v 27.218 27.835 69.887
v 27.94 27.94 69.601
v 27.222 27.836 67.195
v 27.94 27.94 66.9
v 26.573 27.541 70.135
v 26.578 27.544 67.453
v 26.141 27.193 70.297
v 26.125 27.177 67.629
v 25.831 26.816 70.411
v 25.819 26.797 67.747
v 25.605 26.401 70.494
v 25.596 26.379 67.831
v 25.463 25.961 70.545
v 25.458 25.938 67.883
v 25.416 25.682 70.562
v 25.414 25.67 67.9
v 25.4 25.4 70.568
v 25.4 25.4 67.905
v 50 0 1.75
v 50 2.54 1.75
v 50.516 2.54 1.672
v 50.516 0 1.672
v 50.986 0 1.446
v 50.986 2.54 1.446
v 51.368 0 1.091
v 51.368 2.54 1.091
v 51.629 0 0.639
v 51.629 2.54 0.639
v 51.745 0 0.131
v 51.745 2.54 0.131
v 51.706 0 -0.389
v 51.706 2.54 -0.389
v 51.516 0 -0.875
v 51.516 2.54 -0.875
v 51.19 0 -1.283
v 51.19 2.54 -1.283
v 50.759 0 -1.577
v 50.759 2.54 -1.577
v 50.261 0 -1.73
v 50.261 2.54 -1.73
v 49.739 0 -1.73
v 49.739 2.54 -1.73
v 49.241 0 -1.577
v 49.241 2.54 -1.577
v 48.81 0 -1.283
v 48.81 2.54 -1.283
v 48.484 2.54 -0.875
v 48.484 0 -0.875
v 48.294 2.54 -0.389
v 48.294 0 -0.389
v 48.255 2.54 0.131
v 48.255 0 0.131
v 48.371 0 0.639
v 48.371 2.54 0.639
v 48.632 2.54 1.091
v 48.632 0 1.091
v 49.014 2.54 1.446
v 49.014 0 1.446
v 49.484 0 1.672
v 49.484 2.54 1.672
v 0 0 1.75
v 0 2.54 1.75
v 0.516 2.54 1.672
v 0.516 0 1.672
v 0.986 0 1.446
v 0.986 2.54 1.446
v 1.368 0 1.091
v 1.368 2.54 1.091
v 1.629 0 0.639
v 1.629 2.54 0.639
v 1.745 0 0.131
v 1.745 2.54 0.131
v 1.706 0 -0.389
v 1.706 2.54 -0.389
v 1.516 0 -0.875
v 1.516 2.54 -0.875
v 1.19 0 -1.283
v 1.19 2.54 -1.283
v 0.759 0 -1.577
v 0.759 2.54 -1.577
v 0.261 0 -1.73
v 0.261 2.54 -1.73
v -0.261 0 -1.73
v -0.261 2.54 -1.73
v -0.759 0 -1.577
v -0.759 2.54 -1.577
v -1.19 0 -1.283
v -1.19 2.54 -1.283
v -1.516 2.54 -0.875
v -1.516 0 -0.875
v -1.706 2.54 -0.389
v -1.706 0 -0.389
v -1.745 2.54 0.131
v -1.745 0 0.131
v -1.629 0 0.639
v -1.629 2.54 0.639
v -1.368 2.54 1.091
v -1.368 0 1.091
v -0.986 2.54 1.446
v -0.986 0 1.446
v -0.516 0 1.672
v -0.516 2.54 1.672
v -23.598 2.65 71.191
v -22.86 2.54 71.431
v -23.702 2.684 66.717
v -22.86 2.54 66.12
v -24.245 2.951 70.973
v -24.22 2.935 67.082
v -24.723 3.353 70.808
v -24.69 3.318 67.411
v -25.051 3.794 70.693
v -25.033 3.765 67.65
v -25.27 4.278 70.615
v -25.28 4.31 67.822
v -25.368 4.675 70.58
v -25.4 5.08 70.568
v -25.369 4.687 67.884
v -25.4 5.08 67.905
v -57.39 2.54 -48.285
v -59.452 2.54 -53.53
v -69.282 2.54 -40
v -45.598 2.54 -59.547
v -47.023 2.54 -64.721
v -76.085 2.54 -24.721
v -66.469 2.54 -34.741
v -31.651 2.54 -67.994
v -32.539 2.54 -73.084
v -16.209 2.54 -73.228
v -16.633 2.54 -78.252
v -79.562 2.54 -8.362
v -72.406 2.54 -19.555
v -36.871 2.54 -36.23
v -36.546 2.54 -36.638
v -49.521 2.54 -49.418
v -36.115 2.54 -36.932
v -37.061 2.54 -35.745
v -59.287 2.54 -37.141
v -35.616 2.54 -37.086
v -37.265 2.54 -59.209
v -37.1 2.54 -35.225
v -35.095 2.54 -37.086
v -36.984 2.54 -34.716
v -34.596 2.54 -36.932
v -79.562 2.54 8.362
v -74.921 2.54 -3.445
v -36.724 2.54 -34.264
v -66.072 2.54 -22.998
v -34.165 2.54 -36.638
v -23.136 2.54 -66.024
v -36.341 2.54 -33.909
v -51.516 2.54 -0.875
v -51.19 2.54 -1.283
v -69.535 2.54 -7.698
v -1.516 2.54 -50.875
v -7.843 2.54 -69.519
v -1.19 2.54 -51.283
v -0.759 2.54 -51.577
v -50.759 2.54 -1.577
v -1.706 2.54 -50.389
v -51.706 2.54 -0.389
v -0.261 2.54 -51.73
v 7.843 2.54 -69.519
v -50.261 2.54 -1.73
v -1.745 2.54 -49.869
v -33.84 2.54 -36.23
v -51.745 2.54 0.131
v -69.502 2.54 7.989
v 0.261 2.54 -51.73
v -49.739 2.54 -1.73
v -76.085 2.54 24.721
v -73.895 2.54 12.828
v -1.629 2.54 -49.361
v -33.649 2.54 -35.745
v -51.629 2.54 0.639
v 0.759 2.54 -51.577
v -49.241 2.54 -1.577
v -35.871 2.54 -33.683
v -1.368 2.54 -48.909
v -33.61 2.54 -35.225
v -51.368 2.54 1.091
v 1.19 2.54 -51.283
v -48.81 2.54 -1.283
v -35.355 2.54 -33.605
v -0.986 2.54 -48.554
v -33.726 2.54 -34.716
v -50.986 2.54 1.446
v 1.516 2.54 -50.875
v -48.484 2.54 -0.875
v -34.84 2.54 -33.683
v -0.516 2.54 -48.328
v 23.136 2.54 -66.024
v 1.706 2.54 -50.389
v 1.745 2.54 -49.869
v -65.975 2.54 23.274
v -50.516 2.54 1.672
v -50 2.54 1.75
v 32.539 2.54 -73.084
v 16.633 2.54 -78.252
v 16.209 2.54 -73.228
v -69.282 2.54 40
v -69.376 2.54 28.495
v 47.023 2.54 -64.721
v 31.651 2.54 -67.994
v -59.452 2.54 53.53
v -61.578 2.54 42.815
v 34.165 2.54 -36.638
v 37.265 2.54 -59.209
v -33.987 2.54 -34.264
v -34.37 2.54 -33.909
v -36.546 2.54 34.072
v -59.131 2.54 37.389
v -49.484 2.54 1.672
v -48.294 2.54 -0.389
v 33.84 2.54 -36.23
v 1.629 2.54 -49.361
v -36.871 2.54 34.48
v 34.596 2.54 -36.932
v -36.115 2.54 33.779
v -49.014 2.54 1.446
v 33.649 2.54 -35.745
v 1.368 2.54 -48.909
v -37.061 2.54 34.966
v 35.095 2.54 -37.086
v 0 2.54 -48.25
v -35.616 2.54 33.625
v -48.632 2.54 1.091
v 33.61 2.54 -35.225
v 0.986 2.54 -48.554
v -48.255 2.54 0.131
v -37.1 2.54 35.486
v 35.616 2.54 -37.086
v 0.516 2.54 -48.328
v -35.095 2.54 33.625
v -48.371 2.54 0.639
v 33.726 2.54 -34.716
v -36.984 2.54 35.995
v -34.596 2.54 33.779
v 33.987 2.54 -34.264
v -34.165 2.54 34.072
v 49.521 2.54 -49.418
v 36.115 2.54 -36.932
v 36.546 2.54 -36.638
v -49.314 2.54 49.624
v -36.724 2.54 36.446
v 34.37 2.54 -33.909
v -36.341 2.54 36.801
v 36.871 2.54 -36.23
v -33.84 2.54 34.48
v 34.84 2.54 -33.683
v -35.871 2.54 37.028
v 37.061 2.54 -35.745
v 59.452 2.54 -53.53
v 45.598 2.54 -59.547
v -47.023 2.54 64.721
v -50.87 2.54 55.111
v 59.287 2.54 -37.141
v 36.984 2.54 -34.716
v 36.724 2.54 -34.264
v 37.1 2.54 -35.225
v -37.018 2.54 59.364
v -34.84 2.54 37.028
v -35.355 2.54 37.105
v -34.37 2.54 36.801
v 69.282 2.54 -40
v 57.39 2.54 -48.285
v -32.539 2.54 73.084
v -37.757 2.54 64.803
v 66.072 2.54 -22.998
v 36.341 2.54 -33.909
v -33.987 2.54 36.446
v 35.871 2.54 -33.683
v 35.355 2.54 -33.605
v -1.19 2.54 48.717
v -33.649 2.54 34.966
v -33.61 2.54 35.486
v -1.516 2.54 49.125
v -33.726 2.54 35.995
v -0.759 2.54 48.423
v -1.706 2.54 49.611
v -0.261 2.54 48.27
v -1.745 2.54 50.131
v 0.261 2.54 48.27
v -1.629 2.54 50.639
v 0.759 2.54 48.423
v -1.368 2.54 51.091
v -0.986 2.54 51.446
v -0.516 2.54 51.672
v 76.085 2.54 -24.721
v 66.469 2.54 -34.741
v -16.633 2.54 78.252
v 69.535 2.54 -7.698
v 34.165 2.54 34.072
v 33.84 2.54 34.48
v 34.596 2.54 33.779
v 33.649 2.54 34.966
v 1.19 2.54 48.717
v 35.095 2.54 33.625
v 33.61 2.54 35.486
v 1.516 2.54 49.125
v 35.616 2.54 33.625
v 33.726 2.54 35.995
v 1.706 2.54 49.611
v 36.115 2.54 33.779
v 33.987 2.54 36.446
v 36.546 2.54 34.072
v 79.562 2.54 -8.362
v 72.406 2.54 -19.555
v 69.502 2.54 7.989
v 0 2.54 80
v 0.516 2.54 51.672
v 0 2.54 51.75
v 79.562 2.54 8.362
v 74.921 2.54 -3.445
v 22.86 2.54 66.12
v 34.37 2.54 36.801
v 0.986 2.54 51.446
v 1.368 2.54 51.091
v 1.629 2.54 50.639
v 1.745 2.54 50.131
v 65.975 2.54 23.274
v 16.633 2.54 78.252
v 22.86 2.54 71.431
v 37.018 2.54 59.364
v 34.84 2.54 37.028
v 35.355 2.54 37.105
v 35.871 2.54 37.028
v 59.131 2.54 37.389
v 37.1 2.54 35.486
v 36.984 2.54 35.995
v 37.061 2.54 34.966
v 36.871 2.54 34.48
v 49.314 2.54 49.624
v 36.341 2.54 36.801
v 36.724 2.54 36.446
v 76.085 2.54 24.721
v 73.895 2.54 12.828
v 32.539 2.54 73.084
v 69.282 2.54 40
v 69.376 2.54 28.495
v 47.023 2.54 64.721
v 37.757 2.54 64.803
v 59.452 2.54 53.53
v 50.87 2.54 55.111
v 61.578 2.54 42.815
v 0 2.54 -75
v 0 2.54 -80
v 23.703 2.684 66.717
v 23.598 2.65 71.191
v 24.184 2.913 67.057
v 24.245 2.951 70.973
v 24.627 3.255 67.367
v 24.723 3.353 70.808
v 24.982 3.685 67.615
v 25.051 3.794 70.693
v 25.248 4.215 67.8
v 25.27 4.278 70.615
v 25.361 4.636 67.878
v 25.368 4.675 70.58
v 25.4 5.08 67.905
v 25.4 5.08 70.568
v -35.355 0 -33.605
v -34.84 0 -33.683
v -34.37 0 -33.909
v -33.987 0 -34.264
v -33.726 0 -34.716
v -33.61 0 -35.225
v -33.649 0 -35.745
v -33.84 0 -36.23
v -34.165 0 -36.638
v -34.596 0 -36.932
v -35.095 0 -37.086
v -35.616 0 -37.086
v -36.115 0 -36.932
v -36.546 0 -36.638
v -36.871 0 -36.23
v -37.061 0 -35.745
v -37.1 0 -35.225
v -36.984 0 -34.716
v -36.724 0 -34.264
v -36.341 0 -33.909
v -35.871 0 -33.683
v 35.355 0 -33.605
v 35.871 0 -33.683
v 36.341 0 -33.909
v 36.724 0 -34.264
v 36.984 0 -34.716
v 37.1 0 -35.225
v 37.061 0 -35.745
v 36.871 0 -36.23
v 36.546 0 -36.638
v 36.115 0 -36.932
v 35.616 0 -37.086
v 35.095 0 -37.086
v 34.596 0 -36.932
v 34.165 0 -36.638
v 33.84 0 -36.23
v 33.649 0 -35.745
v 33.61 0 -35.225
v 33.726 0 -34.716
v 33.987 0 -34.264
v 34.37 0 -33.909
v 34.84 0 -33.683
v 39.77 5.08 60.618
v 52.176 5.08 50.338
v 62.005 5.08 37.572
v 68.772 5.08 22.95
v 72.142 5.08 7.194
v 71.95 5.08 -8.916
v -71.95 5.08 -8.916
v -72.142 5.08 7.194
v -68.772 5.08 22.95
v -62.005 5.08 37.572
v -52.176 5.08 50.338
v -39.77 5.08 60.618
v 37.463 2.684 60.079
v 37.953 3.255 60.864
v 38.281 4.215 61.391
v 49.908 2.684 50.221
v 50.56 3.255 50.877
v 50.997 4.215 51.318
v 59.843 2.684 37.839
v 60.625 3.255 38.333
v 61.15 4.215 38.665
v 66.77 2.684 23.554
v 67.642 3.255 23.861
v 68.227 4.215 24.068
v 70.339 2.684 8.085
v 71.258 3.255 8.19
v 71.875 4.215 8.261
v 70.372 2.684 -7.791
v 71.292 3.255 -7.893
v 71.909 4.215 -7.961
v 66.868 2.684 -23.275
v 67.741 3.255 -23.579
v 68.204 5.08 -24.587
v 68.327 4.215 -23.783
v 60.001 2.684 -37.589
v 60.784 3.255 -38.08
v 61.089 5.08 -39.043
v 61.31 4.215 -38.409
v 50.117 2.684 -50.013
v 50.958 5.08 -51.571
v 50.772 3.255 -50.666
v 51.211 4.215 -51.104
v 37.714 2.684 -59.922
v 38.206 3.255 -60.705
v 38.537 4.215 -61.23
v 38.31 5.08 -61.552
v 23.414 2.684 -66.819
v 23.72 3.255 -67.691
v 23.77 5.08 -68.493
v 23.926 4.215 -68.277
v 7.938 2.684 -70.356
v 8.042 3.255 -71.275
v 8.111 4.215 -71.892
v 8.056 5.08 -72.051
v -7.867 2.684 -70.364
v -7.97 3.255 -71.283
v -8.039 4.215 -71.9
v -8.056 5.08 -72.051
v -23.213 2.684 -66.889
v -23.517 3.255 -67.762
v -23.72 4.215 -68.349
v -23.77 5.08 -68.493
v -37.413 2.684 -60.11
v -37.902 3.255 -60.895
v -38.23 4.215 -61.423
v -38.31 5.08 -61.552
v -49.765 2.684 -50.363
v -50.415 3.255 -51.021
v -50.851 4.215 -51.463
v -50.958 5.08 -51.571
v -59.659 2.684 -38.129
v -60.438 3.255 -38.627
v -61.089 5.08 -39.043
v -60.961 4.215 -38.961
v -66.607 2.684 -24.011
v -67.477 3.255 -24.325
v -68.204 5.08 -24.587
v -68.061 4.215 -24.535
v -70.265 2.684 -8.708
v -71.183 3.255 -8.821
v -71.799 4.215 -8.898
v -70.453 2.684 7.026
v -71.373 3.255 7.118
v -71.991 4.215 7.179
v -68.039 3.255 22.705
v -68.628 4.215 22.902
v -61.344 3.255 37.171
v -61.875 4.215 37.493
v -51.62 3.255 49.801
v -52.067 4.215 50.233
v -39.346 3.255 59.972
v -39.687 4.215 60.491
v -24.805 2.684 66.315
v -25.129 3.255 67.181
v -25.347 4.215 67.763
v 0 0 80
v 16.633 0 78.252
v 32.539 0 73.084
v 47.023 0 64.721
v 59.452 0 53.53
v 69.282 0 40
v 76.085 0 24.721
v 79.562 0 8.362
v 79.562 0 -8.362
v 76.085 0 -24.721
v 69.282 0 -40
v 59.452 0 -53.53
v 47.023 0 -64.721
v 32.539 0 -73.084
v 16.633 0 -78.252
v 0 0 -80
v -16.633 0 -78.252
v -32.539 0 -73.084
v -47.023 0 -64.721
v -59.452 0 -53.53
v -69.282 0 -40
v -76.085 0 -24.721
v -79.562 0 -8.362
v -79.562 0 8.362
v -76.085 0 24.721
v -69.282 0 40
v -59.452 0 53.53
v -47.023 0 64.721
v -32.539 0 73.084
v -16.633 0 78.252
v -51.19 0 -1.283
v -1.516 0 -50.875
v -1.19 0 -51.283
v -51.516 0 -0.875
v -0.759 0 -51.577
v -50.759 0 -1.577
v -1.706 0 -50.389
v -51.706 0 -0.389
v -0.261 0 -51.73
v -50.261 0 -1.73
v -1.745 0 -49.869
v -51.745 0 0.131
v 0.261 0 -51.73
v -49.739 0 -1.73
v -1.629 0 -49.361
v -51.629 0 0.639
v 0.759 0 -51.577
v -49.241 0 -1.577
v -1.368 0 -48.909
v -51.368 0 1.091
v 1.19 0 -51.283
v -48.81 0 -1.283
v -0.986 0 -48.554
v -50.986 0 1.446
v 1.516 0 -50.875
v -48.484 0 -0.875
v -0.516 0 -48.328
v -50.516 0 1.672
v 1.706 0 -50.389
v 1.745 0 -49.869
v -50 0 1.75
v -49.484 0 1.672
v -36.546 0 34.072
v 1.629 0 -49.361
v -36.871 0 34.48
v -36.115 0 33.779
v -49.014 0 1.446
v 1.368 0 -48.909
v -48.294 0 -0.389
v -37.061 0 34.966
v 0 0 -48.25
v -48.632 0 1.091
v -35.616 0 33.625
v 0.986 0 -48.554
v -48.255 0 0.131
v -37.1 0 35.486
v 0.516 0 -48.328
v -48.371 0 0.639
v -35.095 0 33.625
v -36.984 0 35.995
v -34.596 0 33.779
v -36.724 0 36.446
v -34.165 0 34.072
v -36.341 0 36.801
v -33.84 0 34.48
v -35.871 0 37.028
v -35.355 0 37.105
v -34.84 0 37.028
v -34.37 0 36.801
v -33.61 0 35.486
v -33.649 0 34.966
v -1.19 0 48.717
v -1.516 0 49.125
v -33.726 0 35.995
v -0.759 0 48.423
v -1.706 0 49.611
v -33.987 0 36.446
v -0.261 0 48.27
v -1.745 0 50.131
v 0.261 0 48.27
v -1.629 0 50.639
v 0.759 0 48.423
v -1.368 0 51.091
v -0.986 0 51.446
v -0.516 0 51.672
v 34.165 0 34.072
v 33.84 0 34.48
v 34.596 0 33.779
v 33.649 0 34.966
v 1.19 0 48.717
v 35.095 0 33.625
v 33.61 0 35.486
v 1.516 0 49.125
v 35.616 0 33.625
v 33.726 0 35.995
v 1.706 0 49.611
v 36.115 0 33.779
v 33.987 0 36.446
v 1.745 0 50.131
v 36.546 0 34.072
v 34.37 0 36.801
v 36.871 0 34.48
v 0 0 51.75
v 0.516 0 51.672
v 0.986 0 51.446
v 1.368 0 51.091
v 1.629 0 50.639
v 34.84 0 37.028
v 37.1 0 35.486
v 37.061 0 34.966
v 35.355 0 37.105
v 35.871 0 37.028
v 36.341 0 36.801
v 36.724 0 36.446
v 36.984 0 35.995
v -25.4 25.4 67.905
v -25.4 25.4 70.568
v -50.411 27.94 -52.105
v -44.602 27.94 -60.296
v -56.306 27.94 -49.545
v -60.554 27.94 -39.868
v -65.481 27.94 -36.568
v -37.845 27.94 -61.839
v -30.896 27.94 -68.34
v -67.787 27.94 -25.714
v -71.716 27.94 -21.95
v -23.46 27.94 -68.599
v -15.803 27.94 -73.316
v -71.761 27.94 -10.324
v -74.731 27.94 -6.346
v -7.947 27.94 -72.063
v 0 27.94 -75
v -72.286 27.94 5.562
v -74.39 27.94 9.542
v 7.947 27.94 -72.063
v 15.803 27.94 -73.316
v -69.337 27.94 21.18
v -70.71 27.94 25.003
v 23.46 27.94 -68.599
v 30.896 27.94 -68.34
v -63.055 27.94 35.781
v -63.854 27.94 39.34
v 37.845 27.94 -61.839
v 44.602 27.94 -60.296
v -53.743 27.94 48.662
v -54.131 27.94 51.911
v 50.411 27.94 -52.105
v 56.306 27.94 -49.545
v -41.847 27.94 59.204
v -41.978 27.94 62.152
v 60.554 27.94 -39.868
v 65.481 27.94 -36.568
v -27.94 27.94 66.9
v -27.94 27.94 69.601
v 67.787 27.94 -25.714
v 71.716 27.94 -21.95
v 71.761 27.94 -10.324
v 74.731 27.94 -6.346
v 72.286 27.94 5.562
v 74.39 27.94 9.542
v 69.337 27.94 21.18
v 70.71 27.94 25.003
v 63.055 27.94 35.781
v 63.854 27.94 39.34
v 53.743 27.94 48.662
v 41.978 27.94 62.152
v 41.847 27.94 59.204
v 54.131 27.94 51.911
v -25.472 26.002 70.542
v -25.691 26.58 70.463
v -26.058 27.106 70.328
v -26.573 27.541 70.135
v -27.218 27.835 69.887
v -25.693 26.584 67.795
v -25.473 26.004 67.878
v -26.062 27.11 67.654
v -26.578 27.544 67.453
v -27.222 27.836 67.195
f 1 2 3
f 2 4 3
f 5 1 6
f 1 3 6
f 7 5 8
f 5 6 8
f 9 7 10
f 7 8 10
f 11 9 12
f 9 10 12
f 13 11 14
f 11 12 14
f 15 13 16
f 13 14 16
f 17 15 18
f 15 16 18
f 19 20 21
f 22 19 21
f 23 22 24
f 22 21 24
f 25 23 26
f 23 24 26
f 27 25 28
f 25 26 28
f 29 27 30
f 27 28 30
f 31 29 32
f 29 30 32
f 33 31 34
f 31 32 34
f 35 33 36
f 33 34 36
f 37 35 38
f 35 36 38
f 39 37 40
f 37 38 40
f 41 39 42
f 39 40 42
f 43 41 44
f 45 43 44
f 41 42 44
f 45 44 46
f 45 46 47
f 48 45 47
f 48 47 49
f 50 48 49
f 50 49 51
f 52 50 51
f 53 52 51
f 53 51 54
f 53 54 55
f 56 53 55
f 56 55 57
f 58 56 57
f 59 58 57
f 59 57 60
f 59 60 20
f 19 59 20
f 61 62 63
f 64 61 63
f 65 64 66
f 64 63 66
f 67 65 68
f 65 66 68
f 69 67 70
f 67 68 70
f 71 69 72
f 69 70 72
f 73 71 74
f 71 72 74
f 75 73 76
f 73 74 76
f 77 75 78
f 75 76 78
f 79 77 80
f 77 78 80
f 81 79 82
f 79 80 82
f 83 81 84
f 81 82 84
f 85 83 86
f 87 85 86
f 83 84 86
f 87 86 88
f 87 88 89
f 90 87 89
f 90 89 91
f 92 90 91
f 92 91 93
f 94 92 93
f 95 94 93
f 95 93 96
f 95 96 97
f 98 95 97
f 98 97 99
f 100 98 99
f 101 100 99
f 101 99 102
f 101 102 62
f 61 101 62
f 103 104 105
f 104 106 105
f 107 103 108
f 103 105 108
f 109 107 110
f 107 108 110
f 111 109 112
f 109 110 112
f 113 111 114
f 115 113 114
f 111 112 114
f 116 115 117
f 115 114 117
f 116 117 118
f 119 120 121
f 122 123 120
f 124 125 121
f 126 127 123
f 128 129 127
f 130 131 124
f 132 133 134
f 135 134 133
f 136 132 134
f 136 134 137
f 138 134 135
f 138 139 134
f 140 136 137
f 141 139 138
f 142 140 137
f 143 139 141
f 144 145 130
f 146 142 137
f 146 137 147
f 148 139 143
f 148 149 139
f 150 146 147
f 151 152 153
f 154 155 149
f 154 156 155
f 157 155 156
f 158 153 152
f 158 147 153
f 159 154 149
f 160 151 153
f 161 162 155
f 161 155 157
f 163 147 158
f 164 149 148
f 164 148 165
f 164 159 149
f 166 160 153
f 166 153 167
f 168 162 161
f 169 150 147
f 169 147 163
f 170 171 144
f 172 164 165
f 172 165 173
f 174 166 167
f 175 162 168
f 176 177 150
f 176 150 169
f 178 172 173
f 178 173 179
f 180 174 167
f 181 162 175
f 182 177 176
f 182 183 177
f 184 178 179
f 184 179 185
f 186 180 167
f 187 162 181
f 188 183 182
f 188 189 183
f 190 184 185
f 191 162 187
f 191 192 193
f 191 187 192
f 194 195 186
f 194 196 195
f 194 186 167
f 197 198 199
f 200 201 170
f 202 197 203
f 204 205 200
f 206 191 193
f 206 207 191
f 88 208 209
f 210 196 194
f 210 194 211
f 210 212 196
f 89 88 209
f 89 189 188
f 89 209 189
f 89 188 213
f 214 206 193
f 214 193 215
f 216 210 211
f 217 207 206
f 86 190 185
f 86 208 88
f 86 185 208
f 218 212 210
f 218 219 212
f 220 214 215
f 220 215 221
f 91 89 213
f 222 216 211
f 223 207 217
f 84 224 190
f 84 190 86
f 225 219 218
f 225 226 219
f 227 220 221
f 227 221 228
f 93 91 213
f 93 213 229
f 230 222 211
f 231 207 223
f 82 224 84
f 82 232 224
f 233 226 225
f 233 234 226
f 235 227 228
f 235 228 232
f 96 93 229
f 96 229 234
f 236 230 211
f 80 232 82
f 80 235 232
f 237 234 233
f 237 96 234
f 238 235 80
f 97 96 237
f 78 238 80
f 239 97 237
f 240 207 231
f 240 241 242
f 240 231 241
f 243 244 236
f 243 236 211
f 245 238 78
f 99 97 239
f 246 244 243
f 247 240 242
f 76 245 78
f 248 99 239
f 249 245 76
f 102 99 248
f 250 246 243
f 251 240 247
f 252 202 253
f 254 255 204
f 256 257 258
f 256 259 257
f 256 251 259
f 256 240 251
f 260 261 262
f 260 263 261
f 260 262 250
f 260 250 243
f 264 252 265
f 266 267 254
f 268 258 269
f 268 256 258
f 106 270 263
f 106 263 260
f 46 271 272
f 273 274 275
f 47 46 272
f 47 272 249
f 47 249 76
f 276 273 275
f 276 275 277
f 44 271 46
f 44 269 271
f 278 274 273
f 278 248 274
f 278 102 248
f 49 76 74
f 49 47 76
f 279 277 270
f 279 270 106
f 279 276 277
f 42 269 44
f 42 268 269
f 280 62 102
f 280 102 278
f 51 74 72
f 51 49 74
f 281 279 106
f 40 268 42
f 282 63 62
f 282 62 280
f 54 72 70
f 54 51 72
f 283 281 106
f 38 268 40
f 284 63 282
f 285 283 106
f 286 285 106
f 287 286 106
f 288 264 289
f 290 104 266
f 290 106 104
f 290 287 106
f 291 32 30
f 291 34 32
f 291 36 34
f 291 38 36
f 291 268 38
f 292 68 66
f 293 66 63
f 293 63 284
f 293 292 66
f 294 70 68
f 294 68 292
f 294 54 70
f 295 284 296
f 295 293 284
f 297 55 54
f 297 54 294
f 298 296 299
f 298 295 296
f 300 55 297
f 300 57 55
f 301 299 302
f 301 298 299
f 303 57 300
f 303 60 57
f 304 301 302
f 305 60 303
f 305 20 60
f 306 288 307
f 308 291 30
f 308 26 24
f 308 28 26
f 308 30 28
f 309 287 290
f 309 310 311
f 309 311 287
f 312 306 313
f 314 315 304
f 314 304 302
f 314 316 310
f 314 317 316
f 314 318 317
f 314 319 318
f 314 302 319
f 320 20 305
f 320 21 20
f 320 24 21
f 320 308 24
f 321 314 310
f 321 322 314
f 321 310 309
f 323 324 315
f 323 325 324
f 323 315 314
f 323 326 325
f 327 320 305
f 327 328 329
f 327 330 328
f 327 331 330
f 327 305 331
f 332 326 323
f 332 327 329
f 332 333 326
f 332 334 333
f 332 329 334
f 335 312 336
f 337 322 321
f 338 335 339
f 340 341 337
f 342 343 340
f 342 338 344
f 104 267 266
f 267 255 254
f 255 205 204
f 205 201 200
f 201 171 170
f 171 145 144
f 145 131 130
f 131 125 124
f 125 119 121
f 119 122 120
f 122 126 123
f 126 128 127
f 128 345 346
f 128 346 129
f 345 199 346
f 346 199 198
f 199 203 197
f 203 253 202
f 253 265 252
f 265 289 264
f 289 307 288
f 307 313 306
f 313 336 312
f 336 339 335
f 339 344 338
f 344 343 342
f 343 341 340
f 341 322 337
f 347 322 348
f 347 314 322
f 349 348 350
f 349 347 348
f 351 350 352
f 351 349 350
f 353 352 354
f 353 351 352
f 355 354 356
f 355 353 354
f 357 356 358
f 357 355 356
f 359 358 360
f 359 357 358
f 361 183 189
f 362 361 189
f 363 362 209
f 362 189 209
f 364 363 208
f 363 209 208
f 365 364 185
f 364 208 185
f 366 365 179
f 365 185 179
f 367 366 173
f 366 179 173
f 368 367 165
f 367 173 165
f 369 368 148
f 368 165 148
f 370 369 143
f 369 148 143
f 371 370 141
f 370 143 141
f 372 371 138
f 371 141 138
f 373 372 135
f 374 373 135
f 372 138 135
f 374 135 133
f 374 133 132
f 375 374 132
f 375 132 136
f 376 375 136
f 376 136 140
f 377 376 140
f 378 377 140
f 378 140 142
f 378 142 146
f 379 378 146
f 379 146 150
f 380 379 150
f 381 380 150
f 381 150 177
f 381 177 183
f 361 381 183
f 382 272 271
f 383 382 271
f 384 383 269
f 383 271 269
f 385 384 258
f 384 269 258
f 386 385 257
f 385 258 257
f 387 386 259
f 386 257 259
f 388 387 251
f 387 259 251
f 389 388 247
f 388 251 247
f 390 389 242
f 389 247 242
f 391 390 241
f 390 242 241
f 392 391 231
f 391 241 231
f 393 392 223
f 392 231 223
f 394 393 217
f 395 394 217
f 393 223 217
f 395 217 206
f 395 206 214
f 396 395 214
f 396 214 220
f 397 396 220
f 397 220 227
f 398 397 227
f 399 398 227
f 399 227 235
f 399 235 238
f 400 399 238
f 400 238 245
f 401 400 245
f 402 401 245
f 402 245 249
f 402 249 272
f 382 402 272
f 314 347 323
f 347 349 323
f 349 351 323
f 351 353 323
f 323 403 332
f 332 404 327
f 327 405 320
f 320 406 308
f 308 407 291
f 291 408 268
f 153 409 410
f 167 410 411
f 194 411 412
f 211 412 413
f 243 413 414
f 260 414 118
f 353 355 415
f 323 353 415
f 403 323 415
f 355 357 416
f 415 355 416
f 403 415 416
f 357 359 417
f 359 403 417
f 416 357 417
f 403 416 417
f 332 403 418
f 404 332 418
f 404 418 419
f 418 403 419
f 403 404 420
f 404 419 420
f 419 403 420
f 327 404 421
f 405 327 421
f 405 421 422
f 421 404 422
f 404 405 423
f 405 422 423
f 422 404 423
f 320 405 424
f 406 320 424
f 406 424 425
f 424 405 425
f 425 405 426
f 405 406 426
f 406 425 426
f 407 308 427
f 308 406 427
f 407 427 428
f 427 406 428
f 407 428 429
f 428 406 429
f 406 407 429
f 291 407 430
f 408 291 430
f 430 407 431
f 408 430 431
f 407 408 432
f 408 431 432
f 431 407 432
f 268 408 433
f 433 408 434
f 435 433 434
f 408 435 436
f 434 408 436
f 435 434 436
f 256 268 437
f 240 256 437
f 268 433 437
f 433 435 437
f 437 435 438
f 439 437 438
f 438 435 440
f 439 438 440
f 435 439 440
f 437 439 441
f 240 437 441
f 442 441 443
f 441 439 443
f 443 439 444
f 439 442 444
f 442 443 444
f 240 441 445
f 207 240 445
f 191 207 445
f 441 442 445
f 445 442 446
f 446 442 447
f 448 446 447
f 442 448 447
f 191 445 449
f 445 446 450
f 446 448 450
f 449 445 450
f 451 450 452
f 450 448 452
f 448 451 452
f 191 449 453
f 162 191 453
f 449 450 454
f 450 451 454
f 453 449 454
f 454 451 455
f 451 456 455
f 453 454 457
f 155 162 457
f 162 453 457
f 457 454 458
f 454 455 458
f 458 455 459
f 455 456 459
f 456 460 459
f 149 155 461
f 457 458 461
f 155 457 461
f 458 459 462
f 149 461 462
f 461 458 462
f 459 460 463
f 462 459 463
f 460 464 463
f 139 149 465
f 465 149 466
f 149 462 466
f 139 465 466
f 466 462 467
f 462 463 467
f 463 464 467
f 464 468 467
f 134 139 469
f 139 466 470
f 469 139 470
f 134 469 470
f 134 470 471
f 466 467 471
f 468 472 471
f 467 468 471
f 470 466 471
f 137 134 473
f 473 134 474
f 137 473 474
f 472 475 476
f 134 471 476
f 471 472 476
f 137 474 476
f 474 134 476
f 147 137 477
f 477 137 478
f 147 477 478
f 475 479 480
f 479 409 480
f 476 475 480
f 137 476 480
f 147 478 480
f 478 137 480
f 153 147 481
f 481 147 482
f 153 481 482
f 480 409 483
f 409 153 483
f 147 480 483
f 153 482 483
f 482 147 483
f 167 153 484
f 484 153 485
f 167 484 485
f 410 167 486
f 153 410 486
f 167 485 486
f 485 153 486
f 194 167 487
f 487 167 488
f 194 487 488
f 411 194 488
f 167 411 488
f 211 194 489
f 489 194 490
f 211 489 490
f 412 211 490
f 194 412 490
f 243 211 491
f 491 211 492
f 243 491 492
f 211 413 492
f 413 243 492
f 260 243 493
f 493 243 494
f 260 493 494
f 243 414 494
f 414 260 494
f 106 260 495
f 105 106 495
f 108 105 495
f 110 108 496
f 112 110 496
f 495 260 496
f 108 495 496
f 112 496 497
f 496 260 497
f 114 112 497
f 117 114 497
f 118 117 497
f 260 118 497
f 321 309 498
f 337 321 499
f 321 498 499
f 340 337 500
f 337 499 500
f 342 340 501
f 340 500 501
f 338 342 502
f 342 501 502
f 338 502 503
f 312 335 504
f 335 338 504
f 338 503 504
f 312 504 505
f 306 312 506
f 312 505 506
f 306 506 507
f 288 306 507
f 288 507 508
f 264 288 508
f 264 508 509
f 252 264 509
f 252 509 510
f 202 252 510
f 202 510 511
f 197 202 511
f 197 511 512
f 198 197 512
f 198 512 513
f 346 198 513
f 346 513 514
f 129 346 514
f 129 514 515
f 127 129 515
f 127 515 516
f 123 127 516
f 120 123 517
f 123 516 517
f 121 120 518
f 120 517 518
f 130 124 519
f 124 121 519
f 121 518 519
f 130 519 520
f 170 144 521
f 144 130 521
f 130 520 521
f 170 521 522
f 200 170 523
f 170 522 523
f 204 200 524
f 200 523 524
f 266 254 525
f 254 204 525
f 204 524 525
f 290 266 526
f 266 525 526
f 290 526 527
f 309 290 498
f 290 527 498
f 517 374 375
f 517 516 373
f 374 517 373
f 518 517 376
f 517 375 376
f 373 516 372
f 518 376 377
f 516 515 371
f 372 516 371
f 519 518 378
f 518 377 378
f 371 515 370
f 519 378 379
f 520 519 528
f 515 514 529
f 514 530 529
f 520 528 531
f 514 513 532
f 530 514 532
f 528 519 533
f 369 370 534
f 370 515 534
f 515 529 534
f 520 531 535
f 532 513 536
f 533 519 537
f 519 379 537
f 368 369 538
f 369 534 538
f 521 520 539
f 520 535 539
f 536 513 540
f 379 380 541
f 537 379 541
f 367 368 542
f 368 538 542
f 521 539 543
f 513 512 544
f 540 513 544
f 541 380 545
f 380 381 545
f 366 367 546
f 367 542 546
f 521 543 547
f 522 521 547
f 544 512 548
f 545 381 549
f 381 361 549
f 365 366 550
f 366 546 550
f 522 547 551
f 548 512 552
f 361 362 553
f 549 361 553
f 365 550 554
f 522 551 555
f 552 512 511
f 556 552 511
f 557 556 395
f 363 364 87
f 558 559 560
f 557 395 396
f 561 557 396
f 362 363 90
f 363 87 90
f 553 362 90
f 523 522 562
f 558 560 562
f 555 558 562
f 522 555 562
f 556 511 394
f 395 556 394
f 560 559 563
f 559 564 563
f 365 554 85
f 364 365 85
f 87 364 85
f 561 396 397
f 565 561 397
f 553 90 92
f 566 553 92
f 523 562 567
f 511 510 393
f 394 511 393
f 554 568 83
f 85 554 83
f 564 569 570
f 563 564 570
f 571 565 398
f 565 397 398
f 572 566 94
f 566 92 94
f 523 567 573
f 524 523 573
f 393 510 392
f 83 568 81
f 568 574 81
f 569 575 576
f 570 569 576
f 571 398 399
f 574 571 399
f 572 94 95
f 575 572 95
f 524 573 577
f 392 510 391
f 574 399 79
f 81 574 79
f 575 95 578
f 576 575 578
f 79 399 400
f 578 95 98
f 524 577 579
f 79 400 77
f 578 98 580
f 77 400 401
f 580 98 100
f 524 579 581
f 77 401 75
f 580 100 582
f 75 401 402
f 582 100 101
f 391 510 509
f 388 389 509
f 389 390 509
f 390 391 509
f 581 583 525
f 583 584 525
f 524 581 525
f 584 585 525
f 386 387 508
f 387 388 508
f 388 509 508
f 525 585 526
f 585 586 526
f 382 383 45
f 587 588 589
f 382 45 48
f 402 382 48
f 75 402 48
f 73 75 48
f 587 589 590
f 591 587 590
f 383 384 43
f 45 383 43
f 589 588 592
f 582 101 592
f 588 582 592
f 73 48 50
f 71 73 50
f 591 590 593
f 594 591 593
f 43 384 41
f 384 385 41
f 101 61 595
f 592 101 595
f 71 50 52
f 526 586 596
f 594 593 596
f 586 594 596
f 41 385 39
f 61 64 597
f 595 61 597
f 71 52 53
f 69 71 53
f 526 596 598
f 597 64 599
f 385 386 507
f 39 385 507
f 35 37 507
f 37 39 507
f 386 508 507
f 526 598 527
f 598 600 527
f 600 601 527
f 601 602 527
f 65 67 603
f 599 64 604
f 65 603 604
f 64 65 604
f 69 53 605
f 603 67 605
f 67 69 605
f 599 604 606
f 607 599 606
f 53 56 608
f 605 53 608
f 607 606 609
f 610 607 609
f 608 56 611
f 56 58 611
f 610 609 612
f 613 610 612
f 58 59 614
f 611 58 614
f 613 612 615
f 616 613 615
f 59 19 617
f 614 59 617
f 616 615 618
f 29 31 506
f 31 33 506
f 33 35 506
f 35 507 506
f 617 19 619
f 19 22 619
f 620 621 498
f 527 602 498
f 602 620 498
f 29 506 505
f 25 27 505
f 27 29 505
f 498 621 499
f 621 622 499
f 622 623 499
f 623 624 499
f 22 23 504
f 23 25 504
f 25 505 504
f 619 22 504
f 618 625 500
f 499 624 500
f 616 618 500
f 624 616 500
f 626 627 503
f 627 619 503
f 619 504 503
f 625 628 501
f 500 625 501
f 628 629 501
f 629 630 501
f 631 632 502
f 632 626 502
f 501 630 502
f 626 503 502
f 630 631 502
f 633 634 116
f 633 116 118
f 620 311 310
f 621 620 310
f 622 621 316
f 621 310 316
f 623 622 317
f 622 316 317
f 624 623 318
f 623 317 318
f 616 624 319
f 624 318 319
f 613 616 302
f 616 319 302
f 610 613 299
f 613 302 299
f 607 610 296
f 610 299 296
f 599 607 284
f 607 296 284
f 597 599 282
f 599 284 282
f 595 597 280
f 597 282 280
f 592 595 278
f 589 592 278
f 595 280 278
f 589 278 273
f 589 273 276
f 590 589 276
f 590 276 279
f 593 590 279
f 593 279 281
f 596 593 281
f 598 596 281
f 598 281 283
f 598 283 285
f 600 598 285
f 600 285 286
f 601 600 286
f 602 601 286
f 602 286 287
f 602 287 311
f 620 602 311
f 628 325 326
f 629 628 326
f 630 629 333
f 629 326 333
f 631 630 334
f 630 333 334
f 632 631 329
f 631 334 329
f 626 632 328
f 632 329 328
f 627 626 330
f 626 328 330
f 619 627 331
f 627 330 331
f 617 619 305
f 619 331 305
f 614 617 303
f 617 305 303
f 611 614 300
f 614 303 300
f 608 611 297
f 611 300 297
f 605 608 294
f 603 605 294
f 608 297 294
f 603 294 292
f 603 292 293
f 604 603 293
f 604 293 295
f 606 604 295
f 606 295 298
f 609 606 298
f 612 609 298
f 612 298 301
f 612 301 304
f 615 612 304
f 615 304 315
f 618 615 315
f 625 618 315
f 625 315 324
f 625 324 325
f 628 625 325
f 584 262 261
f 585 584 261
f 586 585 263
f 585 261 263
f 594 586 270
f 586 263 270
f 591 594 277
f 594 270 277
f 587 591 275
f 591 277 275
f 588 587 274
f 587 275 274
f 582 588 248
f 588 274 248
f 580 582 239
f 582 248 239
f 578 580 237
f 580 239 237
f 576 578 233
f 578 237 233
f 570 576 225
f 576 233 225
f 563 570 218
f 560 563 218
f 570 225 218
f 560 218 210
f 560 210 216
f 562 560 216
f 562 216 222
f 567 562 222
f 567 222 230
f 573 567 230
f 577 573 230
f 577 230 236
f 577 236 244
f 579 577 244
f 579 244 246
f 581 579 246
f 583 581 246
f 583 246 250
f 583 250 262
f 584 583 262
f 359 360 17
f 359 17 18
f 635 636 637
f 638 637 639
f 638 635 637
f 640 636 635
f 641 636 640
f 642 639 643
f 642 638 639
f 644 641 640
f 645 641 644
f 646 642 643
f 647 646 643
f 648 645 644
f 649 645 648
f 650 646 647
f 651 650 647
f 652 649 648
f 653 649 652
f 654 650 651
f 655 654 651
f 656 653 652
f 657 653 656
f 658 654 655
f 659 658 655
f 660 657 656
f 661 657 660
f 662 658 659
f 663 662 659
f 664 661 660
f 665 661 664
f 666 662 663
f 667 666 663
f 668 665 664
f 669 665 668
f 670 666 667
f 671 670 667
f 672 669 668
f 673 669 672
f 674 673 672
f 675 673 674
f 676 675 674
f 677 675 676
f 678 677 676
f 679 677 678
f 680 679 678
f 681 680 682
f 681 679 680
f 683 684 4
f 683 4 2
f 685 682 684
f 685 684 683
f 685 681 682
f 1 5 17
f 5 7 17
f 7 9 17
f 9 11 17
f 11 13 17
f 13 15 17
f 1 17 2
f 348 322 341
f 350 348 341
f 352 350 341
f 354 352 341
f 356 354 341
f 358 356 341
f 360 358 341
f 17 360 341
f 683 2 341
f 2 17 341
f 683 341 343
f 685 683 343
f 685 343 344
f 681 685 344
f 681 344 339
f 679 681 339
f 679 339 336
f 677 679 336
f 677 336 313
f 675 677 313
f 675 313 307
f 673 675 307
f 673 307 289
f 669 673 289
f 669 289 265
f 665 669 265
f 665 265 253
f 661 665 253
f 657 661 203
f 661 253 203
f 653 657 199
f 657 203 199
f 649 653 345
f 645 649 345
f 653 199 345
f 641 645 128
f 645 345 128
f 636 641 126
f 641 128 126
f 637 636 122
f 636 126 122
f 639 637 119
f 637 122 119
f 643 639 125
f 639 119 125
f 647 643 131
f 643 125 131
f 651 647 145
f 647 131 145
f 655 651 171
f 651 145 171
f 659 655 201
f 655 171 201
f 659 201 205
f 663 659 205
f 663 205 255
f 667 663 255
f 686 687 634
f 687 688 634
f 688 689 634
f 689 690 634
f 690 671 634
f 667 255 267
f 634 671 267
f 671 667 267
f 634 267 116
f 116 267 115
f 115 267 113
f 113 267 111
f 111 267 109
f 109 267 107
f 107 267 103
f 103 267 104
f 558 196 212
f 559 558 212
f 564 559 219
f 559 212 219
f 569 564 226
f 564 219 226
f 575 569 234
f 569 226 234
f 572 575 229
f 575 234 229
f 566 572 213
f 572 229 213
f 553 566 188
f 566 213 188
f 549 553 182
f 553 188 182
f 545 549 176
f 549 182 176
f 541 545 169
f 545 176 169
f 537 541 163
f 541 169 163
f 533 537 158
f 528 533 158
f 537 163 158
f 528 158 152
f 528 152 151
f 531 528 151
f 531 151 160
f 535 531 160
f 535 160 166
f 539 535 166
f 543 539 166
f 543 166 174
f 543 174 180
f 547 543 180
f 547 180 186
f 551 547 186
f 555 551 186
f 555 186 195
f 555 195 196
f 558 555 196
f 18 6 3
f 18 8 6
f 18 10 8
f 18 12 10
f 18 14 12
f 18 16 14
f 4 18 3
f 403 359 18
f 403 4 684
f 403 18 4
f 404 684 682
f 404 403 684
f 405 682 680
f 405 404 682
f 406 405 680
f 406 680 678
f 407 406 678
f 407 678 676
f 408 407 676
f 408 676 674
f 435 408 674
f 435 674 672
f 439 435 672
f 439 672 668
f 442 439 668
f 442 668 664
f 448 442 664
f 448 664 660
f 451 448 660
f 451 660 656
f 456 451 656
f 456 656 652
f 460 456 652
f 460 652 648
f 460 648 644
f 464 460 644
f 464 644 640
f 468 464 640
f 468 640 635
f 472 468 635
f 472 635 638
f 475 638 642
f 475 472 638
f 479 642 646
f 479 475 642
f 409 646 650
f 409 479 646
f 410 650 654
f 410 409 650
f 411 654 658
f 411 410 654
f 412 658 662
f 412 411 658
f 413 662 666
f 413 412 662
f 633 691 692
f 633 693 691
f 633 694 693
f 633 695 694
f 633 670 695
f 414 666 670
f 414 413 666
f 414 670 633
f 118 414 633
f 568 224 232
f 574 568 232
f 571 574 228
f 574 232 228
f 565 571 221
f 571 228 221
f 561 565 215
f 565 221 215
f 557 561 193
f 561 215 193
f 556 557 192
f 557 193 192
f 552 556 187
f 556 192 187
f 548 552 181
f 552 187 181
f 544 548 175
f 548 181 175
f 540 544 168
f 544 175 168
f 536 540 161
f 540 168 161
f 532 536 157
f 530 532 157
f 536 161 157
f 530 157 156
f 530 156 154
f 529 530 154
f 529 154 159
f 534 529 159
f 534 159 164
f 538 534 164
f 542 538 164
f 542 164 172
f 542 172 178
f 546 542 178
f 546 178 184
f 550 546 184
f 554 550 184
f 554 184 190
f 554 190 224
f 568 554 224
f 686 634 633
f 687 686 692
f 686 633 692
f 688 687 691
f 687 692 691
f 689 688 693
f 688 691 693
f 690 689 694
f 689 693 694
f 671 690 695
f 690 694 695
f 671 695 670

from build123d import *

# Parameters (mm, degrees)
SKETCH1_R           = 80
BOSS_EXTRUDE1_DEPTH = 2.54
SKETCH2_R           = 75
SKETCH2_R_2         = 72.5
BOSS_EXTRUDE2_DEPTH = 25.4
SKETCH3_R           = 1.75
CUT_EXTRUDE1_DEPTH  = 116.953266448
SKETCH4_W           = 50.8
SKETCH4_H           = 25.4
CUT_EXTRUDE2_DEPTH  = 25.4
FILLET1_R           = 2.54


with BuildPart() as part:
    # Sketch1 → Boss-Extrude1 (new body)
    with BuildSketch(Plane(origin=(0, 0, 0), x_dir=(1, 0, 0), z_dir=(0, 1, 0))):
        with Locations(Location((0, 0, 0), (0, 0, 270))):
            Circle(SKETCH1_R)
    extrude(amount=BOSS_EXTRUDE1_DEPTH)

    # Sketch2 → Boss-Extrude2 (add)
    with BuildSketch(Plane(origin=(0, 2.54, 0), x_dir=(1, 0, 0), z_dir=(0, 1, 0))):
        with Locations(Location((0, 0, 0), (0, 0, 270))):
            Circle(SKETCH2_R)
        with Locations(Location((0, 0, 0), (0, 0, 270))):
            Circle(SKETCH2_R_2, mode=Mode.SUBTRACT)
    extrude(amount=BOSS_EXTRUDE2_DEPTH)

    # Sketch3 → Cut-Extrude1 (cut, through all)
    with BuildSketch(Plane(origin=(0, 2.54, 0), x_dir=(1, 0, 0), z_dir=(0, 1, 0))):
        with Locations(Location((0, 50, 0), (0, 0, 270))):
            Circle(SKETCH3_R)
        with Locations(Location((50, 0, 0), (0, 0, 270))):
            Circle(SKETCH3_R)
        with Locations(Location((0, -50, 0), (0, 0, 270))):
            Circle(SKETCH3_R)
        with Locations(Location((-50, 0, 0), (0, 0, 270))):
            Circle(SKETCH3_R)
        with Locations(Location((35.355339059, 35.355339059, 0), (0, 0, 270))):
            Circle(SKETCH3_R)
        with Locations(Location((35.355339059, -35.355339059, 0), (0, 0, 270))):
            Circle(SKETCH3_R)
        with Locations(Location((-35.355339059, -35.355339059, 0), (0, 0, 270))):
            Circle(SKETCH3_R)
        with Locations(Location((-35.355339059, 35.355339059, 0), (0, 0, 270))):
            Circle(SKETCH3_R)
        with Locations(Location((0, 0, 0), (0, 0, 270))):
            Circle(SKETCH3_R)
    extrude(amount=-CUT_EXTRUDE1_DEPTH, mode=Mode.SUBTRACT)

    # Sketch4 → Cut-Extrude2 (cut)
    with BuildSketch(Plane(origin=(0, 27.94, 0), x_dir=(1, 0, 0), z_dir=(0, 1, 0))):
        with Locations((0, -75)):
            Rectangle(SKETCH4_W, SKETCH4_H)
    extrude(amount=-CUT_EXTRUDE2_DEPTH, mode=Mode.SUBTRACT)

    # Fillet1
    fillet1_edges = [part.edges().sort_by_distance(p)[0] for p in [
        (0, 2.54, -72.5),
        (-25.4, 27.94, 69.236494294),
        (25.4, 27.94, 69.236494294),
        (-25.4, 2.54, 69.236494294),
        (25.4, 2.54, 69.236494294),
    ]]
    fillet(fillet1_edges, radius=FILLET1_R)


solid = part.part
